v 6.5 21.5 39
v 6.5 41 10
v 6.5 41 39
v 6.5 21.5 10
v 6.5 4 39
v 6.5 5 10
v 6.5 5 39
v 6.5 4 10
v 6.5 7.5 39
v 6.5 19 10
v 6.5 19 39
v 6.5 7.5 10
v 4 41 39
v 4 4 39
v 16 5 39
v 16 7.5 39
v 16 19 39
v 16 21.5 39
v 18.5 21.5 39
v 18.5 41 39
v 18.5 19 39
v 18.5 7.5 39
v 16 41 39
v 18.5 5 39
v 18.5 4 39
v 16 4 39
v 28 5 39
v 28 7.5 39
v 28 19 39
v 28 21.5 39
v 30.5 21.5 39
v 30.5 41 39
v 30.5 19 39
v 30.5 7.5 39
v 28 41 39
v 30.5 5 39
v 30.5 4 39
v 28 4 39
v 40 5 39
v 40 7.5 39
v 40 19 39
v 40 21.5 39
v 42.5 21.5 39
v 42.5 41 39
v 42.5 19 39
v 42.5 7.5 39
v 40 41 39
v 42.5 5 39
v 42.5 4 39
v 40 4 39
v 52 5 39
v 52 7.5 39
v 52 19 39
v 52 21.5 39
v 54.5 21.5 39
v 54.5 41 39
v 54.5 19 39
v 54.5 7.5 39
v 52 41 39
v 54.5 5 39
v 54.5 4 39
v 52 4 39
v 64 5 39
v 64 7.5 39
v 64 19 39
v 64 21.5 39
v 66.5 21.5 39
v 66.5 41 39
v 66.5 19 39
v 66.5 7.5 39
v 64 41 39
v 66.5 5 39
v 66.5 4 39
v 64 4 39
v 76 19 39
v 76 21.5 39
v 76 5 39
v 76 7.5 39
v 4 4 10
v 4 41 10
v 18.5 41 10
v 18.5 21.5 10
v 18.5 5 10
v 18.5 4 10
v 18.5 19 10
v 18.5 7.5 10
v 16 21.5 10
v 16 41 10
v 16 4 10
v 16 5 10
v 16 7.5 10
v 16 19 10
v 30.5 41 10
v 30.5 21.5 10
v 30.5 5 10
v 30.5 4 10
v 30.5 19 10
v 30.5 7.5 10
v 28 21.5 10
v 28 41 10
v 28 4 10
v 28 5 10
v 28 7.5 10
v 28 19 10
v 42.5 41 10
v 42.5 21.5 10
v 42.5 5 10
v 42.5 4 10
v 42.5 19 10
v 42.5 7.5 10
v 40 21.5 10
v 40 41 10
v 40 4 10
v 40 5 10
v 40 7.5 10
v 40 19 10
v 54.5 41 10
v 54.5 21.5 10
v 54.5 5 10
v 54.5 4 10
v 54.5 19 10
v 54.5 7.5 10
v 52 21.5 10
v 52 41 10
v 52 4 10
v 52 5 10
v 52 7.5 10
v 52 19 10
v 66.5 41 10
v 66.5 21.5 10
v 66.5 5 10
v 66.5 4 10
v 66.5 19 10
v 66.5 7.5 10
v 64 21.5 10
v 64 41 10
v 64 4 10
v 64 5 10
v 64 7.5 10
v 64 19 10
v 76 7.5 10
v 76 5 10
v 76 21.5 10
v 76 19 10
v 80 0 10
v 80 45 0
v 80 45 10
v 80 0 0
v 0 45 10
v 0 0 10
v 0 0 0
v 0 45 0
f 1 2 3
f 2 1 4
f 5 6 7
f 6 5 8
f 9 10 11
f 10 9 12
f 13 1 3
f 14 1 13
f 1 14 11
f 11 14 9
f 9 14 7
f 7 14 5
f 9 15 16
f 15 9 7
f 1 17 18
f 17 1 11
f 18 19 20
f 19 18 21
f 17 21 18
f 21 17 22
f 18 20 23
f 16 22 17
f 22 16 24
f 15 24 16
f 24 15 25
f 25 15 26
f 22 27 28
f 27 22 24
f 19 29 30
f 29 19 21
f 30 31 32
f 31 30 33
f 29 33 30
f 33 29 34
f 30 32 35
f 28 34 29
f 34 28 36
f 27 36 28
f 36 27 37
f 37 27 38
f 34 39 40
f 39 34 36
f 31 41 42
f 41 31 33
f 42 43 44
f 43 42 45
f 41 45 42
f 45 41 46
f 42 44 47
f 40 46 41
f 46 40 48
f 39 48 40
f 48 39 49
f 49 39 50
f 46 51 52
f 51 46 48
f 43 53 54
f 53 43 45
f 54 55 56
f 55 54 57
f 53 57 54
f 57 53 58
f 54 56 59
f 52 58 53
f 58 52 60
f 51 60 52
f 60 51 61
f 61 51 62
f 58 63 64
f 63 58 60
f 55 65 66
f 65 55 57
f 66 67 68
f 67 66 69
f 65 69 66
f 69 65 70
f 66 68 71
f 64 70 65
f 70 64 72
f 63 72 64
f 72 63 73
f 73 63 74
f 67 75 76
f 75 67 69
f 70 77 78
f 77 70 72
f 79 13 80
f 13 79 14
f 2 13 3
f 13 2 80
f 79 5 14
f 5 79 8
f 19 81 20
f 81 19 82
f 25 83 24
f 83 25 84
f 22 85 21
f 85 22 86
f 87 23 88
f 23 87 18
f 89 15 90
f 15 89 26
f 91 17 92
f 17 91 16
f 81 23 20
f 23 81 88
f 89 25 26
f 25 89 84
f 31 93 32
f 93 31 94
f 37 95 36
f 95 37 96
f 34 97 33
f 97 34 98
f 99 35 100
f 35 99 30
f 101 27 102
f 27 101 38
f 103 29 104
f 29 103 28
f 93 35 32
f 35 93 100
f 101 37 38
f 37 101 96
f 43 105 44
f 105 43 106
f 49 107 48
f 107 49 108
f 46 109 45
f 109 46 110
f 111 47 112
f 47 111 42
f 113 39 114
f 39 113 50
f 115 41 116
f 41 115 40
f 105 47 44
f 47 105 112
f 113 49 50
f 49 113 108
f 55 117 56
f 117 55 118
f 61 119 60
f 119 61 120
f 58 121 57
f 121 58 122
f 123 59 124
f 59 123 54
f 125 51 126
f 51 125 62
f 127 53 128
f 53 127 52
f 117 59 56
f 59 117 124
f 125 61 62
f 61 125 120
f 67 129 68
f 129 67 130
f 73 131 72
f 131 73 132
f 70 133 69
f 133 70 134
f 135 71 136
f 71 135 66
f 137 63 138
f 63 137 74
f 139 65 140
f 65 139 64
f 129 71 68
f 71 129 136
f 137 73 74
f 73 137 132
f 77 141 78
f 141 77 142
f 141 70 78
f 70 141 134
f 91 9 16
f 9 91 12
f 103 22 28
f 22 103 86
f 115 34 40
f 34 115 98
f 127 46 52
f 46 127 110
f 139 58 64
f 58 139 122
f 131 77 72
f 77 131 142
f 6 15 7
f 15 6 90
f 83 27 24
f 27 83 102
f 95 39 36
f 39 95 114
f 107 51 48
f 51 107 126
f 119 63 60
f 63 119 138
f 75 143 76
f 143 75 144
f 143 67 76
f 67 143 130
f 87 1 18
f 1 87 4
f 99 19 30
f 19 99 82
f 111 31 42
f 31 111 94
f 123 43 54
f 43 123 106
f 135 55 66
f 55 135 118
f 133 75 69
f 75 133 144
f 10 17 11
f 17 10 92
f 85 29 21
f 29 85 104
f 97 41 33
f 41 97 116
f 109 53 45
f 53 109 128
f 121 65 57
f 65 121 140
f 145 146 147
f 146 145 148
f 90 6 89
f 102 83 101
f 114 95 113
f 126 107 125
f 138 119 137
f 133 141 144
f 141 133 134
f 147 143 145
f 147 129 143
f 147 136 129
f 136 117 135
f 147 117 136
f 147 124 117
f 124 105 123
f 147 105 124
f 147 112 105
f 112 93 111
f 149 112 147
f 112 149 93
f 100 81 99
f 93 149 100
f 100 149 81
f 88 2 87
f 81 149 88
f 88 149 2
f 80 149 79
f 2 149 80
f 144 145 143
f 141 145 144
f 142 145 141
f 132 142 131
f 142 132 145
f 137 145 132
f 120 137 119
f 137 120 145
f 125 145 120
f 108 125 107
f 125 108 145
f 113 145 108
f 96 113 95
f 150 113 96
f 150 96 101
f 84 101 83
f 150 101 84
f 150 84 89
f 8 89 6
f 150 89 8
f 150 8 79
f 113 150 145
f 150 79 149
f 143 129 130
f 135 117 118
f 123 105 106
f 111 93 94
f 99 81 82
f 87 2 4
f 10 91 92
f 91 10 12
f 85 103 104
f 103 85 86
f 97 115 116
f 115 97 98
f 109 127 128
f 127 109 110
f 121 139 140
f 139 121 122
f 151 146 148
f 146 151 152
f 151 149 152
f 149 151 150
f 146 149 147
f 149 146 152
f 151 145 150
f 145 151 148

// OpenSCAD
$fn = 32;

// ----------------------------------------------------------------------
// Heatsink: cross fin block
// ----------------------------------------------------------------------

// --- parameters (mm) ---
base_l = 80;              // base length, X
base_w = 45;              // base width, Y
base_t = 10;              // base plate thickness
fin_h = 30;               // fin height above the base
fin_t = 2.5;              // fin thickness
edge = 4;                 // margin from the base ends
pitch = 12;               // fin pitch
rib_pitch = 14;           // cross rib pitch

n_fins = floor((base_l - 2 * edge - fin_t) / pitch) + 1;  // fin count
total_h = base_t + fin_h - 1;  // overall height
n_ribs = floor((base_w - 2 * edge) / rib_pitch);  // rib count

union() {
  cube([base_l, base_w, base_t]);
  for (i = [0 : n_fins - 1])
    translate([edge + i * pitch, edge, base_t - 1])
      cube([fin_t, base_w - 2 * edge, fin_h]);
  for (i = [0 : n_ribs - 1])
    translate([edge, edge + 1 + i * rib_pitch, base_t - 1])
      cube([base_l - 2 * edge, fin_t, fin_h]);
}
